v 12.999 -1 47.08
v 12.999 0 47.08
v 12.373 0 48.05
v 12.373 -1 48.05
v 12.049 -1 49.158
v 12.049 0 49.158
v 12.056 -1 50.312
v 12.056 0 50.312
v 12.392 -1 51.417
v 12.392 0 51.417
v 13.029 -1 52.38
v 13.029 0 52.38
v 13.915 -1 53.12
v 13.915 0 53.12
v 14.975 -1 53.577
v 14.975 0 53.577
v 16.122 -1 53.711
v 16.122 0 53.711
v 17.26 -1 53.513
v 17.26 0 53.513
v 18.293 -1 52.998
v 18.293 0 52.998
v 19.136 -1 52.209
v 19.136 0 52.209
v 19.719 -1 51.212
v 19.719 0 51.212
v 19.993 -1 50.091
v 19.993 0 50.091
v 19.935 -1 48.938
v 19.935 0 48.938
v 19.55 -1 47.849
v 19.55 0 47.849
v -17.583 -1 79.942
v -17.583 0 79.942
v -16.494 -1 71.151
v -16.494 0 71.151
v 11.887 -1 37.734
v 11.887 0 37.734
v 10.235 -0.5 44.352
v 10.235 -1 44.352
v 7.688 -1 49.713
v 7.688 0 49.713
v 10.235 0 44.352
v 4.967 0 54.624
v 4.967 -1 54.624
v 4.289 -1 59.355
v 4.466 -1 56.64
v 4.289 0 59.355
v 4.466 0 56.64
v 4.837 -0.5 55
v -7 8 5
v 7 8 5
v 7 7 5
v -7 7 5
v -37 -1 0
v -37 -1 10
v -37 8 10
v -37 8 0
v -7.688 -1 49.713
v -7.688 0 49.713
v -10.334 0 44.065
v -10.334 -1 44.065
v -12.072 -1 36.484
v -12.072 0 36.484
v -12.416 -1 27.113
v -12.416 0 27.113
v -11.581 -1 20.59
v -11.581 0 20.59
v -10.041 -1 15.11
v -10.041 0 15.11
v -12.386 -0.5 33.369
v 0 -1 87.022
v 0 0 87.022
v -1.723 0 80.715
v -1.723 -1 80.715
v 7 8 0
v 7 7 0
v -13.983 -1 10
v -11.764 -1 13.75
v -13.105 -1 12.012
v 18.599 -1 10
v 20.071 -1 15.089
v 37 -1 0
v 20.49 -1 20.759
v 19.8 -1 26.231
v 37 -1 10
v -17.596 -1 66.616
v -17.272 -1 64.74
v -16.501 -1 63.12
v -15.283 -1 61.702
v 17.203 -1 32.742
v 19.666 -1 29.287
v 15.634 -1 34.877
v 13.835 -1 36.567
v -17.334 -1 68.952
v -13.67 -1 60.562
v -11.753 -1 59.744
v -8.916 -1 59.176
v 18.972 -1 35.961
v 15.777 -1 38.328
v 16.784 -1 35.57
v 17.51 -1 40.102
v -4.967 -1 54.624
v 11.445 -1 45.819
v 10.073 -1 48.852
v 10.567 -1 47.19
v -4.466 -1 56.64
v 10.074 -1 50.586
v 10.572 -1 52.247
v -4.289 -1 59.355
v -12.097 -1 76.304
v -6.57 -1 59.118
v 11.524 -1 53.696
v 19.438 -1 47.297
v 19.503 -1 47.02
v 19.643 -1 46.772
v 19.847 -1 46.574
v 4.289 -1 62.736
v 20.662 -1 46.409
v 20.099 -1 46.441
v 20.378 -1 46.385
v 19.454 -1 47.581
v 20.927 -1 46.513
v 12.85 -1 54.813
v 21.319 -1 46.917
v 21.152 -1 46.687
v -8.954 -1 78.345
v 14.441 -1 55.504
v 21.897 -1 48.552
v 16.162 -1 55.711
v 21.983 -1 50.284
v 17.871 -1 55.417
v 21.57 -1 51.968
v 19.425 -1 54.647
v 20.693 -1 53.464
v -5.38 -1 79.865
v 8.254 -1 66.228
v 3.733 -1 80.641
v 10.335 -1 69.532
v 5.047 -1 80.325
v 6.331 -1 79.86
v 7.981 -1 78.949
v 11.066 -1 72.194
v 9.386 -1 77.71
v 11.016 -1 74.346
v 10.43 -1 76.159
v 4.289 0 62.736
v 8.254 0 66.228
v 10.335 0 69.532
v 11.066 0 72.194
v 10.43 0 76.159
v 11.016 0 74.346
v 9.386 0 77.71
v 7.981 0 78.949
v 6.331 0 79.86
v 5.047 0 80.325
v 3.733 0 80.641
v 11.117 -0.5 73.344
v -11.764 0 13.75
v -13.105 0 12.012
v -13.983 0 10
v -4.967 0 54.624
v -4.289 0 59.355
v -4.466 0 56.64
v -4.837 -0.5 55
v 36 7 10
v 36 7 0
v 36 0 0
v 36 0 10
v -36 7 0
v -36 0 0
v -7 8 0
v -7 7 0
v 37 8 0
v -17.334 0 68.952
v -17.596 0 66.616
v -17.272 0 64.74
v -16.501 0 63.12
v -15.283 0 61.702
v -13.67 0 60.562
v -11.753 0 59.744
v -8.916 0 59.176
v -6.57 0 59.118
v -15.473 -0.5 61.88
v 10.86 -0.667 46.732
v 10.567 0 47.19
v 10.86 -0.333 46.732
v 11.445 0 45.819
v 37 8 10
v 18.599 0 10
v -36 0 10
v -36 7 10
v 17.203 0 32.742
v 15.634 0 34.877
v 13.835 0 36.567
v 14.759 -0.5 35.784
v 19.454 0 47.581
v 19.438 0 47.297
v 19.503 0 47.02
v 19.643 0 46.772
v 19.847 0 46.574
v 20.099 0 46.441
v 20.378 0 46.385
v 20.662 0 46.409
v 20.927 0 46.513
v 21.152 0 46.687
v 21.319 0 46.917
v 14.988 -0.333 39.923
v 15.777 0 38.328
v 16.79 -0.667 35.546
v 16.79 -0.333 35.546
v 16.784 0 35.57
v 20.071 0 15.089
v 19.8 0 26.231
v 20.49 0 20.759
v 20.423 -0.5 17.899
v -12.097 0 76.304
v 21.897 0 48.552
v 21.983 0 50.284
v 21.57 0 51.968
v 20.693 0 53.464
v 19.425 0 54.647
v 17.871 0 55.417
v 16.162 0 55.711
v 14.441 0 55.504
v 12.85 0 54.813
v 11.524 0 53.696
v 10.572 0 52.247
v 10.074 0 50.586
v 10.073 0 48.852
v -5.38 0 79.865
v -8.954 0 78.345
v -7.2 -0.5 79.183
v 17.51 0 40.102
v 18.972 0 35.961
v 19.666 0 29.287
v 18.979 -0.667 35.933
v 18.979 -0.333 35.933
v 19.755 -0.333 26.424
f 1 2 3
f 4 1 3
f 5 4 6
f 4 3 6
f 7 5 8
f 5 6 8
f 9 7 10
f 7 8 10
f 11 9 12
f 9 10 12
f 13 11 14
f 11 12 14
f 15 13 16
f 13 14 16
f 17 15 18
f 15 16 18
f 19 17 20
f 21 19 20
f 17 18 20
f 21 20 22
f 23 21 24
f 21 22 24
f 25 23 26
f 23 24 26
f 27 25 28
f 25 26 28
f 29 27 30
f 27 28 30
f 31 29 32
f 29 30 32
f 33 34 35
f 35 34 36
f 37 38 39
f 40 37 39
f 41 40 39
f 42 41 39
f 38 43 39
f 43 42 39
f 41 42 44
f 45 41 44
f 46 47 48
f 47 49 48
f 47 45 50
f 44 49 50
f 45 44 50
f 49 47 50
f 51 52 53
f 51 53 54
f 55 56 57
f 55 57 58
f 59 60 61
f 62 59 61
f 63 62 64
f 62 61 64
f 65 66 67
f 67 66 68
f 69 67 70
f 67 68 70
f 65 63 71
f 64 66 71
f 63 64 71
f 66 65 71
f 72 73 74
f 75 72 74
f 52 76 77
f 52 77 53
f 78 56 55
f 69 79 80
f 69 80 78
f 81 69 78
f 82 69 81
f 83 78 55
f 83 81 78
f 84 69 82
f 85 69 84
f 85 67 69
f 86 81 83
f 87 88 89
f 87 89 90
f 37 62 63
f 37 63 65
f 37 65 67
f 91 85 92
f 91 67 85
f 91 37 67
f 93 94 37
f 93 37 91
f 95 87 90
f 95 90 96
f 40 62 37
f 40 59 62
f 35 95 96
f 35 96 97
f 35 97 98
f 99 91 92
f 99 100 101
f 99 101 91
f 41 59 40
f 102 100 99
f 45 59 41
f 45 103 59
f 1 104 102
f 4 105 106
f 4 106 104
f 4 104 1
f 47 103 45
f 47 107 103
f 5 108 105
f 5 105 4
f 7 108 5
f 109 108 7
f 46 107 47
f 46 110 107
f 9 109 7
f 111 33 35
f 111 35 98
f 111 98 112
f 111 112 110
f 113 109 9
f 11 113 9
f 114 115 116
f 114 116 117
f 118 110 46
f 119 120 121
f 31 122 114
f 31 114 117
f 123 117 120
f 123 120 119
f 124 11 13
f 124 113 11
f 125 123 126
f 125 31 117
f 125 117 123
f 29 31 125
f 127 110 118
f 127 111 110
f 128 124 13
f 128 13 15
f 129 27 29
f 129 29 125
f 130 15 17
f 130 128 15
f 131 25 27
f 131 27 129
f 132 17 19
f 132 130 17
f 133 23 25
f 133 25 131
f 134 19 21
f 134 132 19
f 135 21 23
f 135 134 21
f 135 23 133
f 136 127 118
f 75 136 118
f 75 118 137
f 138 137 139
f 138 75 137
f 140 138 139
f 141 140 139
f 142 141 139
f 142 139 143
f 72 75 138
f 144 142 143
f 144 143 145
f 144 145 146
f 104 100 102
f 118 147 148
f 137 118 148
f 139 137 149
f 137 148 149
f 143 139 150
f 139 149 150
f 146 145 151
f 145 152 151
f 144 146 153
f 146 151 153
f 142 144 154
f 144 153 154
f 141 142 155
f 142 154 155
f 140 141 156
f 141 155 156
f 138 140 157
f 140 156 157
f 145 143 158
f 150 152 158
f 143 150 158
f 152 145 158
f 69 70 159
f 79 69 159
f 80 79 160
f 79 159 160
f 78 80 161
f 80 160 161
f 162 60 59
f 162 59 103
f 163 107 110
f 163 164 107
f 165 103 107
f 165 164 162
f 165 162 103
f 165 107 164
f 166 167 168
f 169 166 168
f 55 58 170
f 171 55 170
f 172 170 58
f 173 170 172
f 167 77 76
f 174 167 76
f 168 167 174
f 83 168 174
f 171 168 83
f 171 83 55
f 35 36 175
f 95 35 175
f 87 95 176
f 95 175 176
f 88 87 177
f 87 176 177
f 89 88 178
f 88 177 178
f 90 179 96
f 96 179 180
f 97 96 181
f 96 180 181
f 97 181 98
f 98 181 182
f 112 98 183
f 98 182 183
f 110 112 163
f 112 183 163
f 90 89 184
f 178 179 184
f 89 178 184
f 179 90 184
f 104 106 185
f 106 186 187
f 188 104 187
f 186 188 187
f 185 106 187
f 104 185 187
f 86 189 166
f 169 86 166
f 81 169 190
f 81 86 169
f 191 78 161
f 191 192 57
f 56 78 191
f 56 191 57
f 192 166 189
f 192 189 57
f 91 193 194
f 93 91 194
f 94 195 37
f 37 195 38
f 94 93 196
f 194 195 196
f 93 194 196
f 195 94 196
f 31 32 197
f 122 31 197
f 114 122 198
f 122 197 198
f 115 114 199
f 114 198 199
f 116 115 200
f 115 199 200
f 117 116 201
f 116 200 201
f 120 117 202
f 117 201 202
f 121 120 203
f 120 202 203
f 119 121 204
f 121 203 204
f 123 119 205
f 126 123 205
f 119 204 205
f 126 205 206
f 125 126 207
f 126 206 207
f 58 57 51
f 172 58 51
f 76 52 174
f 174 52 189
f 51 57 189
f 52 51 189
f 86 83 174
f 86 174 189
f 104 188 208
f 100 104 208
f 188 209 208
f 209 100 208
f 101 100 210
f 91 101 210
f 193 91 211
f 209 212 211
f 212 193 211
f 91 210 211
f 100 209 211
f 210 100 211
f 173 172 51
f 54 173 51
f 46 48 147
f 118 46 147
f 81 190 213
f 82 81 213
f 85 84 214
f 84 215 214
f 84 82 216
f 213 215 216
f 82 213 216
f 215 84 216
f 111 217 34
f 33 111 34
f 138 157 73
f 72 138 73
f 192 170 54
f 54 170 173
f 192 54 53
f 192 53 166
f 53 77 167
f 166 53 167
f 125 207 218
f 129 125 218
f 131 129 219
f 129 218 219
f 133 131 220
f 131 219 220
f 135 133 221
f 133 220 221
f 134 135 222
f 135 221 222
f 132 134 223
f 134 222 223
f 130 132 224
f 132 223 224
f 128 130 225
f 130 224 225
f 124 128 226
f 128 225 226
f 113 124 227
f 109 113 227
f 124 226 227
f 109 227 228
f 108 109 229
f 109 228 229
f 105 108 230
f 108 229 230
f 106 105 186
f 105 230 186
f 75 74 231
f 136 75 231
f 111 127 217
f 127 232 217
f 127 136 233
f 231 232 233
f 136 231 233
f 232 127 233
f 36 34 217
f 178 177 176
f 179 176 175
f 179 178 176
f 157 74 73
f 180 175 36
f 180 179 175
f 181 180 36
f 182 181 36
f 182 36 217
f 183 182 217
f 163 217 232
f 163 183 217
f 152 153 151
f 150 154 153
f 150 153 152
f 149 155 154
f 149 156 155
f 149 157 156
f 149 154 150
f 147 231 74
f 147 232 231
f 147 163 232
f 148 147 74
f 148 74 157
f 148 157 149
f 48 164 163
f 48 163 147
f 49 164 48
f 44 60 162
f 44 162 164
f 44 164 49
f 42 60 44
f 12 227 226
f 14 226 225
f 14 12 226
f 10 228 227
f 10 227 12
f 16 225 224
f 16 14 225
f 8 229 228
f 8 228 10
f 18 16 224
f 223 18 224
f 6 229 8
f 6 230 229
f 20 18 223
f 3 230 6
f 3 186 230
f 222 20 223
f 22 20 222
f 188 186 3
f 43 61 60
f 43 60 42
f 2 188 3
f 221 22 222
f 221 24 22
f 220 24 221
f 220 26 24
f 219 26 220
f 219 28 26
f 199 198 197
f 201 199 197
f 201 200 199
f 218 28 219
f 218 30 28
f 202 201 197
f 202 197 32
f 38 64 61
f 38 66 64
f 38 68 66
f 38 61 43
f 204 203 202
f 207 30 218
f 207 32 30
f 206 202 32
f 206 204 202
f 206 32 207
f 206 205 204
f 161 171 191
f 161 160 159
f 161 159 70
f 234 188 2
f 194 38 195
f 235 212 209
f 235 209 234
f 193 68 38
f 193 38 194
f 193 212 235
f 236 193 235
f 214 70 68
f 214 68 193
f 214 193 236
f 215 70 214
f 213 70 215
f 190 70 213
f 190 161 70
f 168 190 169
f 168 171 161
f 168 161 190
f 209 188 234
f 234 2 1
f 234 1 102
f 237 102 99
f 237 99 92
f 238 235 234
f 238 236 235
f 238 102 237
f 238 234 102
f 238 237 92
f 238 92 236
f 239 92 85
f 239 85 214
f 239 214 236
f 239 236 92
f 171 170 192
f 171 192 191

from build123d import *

# Parameters (mm, degrees)
F1_DEPTH = 1
F3_DEPTH = 9
F4_W     = 72
F4_H     = 7
F5_DEPTH = 15
F6_W     = 14
F6_H     = 5
F7_DEPTH = 3


with BuildPart() as f1:
    # F0 (on Front) → F1 (new body)
    with BuildSketch(Plane.XZ):
        with BuildLine():
            ThreePointArc((-10.0408443114, 15.1095405693), (-12.4884072009, 12.922316679), (-13.9832575854, 10))
            Line((-13.9832575854, 10), (-7.5, 10))
            Line((-7.5, 10), (18.5986325968, 10))
            add(Edge.make_bspline(
                [(18.5986325968, 10), (21.7874042537, 17.6571019048), (19.80032664, 26.2314829268)],
                knots=[4.1400176542, 4.1400176542, 4.1400176542, 5.0566635569, 5.0566635569, 5.0566635569], degree=2, weights=[1, 0.8967957597, 1]))
            add(Edge.make_bspline(
                [(12.9993207665, 47.0798322294), (15.450324346, 43.741998707), (20.1470988099, 37.5454970427), (19.5750997548, 26.5514442031), (19.804460929, 26.2712905063), (19.80032664, 26.2314829268)],
                knots=[0, 0, 0, 0, 0.5016072838, 0.9372111202, 1, 1, 1, 1], degree=3))
            ThreePointArc((12.9993207665, 47.0798322294), (15.5438900017, 53.6856045082), (19.5497050621, 47.8491239167))
            ThreePointArc((19.5497050621, 47.8491239167), (19.9685720284, 46.4983646989), (21.3193312462, 46.9172316652))
            ThreePointArc((21.3193312462, 46.9172316652), (16.1624355435, 55.7109825264), (10.5667996719, 47.1896864578))
            add(Edge.make_bspline(
                [(10.5667996719, 47.1896864578), (10.8605309783, 46.7321602294), (11.154313152, 46.2747029689), (11.4453972129, 45.8192883847)],
                knots=[0, 0, 0, 0, 0.0776469035, 0.0776469035, 0.0776469035, 0.0776469035], degree=3))
            add(Edge.make_bspline(
                [(11.4453972129, 45.8192883847), (12.767933728, 43.7501183476), (15.1878409182, 39.878150916), (16.9341324434, 35.7137130449), (17.1275061277, 33.6475465249), (17.2028191458, 32.7424766632)],
                knots=[0.0776469035, 0.0776469035, 0.0776469035, 0.0776469035, 0.430434565, 0.7515396694, 1, 1, 1, 1], degree=3))
            add(Edge.make_bspline(
                [(17.2028191458, 32.7424766632), (14.9801521234, 36.3481891595), (11.8867786303, 37.7342081157)],
                knots=[5.474108615, 5.474108615, 5.474108615, 6.0012992542, 6.0012992542, 6.0012992542], degree=2, weights=[1, 0.9654594475, 1]))
            add(Edge.make_bspline(
                [(11.8867786303, 37.7342081157), (10.7035302137, 45.0083914749), (7.68767306, 49.7129077432)],
                knots=[1.8853250248, 1.8853250248, 1.8853250248, 2.4791891292, 2.4791891292, 2.4791891292], degree=2, weights=[1, 0.9562386323, 1]))
            add(Edge.make_bspline(
                [(7.68767306, 49.7129077432), (6.5442123198, 51.4971863092), (4.4054650757, 54.7938829615), (4.3260539824, 57.9122155888), (4.2892550944, 59.3554241747)],
                knots=[0, 0, 0, 0, 0.5391239155, 1, 1, 1, 1], degree=3))
            Line((4.2892550944, 59.3554241747), (4.2892550944, 62.7361203619))
            add(Edge.make_bspline(
                [(4.2892550944, 62.7361203619), (25.1855731849, 76.6200768708), (3.7327027616, 80.6413343112)],
                knots=[1.8494400705, 1.8494400705, 1.8494400705, 3.9321155412, 3.9321155412, 3.9321155412], degree=2, weights=[1, 0.505066136, 1]))
            Line((3.7327027616, 80.6413343112), (0, 87.0222076774))
            Line((0, 87.0222076774), (-1.7229665969, 80.7154094089))
            add(Edge.make_bspline(
                [(-1.7229665969, 80.7154094089), (-7.5136196625, 79.9089208722), (-12.0973469547, 76.3038908078)],
                knots=[4.3332693398, 4.3332693398, 4.3332693398, 5.1037535185, 5.1037535185, 5.1037535185], degree=2, weights=[1, 0.9267074866, 1]))
            Line((-12.0973469547, 76.3038908078), (-17.5828682239, 79.9423769641))
            Line((-17.5828682239, 79.9423769641), (-16.4939268376, 71.1509964352))
            add(Edge.make_bspline(
                [(-16.4939268376, 71.1509964352), (-24.166699821, 56.1098731464), (-4.2892550944, 59.3554241747)],
                knots=[5.6147383929, 5.6147383929, 5.6147383929, 7.5075967098, 7.5075967098, 7.5075967098], degree=2, weights=[1, 0.5845839527, 1]))
            add(Edge.make_bspline(
                [(-7.68767306, 49.7129077432), (-6.5442123198, 51.4971863092), (-4.4054650757, 54.7938829615), (-4.3260539824, 57.9122155888), (-4.2892550944, 59.3554241747)],
                knots=[0, 0, 0, 0, 0.5391239155, 1, 1, 1, 1], degree=3))
            add(Edge.make_bspline(
                [(-7.68767306, 49.7129077432), (-17.3068218361, 34.7077401912), (-10.0408443114, 15.1095405693)],
                knots=[3.803996178, 3.803996178, 3.803996178, 5.3504242368, 5.3504242368, 5.3504242368], degree=2, weights=[1, 0.7156695663, 1]))
        make_face()
    extrude(amount=F1_DEPTH)

    # F2 (on face) → F3 (join)
    with BuildSketch(Plane.XZ.offset(1)):
        Polygon((-37, 10), (-37, 0), (37, 0), (37, 10), (18.5986325968, 10), (-13.9832575854, 10), align=None)
    extrude(amount=-F3_DEPTH)

    # F4 (on face) → F5 (cut)
    with BuildSketch(Plane(origin=(0, 0, 0), x_dir=(1, 0, 0), z_dir=(0, 0, -1))):
        with Locations((0, -3.5)):
            Rectangle(F4_W, F4_H)
    extrude(amount=-F5_DEPTH, mode=Mode.SUBTRACT)

    # F6 (on face) → F7 (cut)
    with BuildSketch(Plane(origin=(0, 8, 0), x_dir=(-1, 0, 0), z_dir=(0, 1, 0))):
        with Locations((0, 2.5)):
            Rectangle(F6_W, F6_H)
    extrude(amount=-F7_DEPTH, mode=Mode.SUBTRACT)


solid = f1.part
